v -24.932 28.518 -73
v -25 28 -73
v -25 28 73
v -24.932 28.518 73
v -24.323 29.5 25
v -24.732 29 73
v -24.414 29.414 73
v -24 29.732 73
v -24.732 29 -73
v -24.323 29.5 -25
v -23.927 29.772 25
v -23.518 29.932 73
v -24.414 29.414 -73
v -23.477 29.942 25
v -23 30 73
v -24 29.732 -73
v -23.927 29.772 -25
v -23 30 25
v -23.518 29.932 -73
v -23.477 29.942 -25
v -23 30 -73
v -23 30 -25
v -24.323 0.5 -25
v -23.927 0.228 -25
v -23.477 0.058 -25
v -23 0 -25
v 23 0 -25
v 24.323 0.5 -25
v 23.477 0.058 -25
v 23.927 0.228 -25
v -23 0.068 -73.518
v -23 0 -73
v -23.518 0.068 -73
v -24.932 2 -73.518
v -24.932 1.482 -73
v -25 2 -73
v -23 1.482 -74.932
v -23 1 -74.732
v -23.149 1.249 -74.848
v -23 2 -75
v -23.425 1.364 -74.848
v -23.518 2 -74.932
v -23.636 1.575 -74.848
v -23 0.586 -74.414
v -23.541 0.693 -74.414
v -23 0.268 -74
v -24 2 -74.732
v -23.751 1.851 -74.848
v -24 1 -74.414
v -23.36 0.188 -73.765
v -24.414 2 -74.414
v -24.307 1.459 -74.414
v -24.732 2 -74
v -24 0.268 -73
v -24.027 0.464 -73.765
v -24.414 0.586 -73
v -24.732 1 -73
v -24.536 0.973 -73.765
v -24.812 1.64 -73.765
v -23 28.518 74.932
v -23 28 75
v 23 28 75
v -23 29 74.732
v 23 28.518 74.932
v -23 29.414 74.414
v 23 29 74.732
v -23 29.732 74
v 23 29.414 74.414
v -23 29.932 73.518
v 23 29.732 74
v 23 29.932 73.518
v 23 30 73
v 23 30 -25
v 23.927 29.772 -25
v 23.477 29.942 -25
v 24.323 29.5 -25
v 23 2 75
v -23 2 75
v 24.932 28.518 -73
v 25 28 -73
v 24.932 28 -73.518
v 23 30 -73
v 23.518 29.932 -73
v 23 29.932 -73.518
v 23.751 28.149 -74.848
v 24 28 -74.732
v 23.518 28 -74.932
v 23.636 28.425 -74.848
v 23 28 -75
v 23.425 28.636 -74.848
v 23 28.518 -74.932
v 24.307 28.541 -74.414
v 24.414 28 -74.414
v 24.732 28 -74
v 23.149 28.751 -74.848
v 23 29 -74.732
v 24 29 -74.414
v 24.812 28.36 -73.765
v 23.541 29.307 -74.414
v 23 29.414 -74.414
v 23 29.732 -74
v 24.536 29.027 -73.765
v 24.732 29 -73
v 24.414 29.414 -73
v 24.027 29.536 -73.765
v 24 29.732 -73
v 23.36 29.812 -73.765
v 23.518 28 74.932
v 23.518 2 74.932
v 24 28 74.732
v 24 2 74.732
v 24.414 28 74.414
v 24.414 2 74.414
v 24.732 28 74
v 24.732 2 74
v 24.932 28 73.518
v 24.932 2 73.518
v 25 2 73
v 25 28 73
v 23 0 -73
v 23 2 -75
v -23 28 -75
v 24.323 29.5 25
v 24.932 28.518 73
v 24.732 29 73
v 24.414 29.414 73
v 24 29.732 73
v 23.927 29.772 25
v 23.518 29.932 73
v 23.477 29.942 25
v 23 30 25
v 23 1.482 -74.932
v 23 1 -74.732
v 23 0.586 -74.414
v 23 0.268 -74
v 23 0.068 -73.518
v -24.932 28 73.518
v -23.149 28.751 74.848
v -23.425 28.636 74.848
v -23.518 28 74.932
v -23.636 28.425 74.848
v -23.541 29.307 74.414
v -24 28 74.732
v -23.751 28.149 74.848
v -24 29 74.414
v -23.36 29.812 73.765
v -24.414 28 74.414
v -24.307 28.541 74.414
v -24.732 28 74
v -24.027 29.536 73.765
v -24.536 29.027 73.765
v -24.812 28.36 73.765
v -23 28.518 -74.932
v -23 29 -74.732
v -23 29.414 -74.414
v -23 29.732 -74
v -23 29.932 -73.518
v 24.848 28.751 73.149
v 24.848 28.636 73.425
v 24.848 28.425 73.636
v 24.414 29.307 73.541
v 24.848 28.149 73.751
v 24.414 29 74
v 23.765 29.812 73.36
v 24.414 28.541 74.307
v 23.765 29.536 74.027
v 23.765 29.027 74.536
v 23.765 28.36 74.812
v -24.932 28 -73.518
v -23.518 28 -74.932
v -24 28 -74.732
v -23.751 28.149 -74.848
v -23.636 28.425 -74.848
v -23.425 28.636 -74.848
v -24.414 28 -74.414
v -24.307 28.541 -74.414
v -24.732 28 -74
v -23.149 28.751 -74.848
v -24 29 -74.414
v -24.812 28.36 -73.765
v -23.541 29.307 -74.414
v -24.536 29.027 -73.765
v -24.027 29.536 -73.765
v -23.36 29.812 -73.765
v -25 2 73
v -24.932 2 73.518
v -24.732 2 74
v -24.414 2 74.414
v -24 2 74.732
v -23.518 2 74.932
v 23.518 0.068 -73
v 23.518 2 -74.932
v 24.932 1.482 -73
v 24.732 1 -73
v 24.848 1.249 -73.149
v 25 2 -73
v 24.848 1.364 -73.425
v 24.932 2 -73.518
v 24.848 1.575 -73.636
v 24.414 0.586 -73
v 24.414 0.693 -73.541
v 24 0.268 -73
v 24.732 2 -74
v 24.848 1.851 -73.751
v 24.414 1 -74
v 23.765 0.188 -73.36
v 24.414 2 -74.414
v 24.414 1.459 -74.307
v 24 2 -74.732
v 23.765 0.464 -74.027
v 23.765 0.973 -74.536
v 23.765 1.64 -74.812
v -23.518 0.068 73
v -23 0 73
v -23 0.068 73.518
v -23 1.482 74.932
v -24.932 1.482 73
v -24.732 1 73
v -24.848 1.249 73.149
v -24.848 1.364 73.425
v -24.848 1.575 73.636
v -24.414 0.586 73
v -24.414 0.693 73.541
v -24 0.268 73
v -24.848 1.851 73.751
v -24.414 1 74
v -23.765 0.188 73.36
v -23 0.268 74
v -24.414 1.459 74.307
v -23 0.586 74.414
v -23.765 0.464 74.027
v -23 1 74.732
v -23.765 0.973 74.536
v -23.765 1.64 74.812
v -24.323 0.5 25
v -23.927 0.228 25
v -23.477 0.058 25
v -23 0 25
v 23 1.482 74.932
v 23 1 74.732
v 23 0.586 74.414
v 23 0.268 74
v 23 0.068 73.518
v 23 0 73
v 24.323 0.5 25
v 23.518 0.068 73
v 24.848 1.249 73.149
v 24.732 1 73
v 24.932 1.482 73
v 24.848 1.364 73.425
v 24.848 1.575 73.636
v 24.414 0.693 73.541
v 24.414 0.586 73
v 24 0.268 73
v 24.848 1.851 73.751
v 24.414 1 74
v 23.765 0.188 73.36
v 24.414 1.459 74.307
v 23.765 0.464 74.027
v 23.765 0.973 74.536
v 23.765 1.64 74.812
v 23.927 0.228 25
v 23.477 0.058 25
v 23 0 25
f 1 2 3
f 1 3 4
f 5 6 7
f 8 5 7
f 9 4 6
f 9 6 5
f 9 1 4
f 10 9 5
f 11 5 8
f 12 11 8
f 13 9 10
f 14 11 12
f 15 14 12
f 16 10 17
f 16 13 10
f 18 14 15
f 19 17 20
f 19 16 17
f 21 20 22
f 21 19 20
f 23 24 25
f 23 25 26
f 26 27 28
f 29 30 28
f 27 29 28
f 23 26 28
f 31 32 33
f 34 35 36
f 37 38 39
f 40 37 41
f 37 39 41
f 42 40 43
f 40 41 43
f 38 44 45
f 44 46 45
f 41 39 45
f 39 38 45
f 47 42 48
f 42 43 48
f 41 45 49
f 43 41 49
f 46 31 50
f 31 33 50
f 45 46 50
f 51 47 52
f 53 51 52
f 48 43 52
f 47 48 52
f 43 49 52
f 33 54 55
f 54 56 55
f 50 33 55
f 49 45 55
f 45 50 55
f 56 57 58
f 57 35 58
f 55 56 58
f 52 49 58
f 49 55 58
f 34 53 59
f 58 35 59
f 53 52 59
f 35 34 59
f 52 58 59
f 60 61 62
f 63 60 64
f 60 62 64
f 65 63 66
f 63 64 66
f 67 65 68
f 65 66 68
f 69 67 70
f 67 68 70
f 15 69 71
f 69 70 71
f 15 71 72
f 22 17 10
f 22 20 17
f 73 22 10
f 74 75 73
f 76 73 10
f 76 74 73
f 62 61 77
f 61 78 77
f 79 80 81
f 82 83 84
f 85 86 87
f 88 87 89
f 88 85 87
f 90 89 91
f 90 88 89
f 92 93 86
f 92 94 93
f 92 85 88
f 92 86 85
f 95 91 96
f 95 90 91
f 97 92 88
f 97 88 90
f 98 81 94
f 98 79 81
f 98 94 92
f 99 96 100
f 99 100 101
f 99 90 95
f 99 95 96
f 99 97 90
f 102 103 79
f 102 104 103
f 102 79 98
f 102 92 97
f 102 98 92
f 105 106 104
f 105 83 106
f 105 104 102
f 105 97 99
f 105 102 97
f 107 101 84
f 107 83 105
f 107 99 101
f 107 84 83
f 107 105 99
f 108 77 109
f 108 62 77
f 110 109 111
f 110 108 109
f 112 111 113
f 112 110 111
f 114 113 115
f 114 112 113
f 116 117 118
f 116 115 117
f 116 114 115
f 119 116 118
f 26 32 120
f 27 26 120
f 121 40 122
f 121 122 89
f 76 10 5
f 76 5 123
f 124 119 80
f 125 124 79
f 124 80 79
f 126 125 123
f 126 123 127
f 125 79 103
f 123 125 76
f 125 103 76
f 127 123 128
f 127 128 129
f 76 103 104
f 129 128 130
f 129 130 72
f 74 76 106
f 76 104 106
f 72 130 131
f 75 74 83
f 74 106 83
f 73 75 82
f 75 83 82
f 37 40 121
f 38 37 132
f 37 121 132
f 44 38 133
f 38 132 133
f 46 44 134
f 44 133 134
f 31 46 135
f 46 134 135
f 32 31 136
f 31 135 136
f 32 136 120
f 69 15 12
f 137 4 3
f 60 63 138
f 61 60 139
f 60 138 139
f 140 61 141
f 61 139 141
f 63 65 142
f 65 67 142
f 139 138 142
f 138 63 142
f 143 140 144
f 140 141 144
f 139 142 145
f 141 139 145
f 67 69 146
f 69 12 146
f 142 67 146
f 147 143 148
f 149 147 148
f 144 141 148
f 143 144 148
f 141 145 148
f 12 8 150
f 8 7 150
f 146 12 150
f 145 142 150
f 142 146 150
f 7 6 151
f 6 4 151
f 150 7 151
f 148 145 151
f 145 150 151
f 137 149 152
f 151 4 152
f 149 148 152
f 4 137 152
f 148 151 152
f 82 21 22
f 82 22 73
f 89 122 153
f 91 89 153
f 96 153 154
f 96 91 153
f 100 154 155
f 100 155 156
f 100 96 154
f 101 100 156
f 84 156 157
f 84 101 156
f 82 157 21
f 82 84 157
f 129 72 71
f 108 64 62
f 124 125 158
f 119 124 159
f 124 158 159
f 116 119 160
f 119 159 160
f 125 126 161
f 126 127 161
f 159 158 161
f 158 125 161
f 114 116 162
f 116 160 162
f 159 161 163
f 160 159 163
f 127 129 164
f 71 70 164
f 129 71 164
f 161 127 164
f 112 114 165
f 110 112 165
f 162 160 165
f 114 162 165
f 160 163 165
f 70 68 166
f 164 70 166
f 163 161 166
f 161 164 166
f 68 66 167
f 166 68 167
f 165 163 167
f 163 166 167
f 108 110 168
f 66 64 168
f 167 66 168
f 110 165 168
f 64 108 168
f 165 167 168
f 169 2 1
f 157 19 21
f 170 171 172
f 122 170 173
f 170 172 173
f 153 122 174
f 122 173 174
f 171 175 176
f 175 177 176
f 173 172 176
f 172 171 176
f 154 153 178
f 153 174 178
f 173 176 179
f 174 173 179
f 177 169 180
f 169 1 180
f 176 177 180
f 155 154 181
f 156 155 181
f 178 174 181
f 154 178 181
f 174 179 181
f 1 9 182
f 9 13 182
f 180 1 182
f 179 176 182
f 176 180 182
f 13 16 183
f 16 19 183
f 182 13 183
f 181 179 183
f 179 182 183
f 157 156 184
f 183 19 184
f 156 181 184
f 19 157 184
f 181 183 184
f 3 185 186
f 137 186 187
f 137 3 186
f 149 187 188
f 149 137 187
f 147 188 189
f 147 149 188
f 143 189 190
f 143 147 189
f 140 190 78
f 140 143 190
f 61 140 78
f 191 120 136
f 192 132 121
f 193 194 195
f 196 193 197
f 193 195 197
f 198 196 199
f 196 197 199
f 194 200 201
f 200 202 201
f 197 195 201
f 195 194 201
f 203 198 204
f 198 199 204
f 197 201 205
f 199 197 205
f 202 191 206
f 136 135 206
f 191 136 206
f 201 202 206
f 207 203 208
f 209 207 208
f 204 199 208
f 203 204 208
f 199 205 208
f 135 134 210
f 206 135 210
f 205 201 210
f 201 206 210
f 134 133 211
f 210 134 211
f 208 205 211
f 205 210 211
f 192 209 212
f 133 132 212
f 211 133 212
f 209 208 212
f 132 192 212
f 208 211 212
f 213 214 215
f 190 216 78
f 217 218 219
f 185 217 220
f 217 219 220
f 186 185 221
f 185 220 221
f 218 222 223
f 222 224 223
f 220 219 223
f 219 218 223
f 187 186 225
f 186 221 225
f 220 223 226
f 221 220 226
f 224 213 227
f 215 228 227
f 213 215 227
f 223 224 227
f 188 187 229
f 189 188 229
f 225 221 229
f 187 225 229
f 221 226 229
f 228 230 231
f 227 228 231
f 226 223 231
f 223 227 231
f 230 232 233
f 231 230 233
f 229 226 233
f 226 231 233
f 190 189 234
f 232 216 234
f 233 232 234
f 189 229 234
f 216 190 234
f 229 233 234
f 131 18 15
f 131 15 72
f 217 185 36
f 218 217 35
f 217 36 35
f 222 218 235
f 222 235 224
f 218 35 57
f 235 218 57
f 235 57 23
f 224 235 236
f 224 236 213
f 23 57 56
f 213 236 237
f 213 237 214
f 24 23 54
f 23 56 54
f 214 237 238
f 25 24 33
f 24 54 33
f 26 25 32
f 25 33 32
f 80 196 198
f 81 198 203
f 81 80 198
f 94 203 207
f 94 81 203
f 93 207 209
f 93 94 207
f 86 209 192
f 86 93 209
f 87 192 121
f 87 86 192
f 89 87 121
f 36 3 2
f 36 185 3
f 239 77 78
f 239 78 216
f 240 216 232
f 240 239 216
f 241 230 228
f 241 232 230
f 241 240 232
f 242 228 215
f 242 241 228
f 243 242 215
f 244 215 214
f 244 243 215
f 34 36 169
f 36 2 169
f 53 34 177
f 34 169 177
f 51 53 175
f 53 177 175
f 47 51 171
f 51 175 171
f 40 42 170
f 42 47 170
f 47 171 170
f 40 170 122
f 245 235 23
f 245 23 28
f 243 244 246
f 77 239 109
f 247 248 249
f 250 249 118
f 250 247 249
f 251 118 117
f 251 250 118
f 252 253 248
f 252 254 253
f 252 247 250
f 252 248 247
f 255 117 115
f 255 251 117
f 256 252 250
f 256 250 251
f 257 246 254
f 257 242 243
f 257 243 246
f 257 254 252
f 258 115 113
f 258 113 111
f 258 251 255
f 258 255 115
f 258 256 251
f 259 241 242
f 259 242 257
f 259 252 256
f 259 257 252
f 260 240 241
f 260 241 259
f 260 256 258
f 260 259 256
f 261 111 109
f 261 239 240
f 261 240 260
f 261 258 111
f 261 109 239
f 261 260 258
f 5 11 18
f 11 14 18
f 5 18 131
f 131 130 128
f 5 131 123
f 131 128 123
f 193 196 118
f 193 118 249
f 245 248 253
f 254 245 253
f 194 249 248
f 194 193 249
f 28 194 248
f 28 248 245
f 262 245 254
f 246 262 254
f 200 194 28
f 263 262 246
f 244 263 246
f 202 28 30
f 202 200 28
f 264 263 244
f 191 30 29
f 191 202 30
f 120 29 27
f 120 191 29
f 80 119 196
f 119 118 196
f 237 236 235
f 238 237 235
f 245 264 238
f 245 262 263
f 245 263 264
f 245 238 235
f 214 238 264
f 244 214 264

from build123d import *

# Parameters (mm, degrees)
SKETCH2_W           = 50
SKETCH2_H           = 150
BOSS_EXTRUDE1_DEPTH = 30
FILLET1_R           = 2
SKETCH3_W           = 99.739454276
SKETCH3_H           = 50
CUT_EXTRUDE1_DEPTH  = 0.5
SKETCH4_W           = 84.567654974
SKETCH4_H           = 50
CUT_EXTRUDE2_DEPTH  = 0.5


with BuildPart() as part:
    # Sketch2 → Boss-Extrude1 (new body)
    with BuildSketch(Plane(origin=(0, 0, 0), x_dir=(1, 0, 0), z_dir=(0, 1, 0))):
        Rectangle(SKETCH2_W, SKETCH2_H)
    extrude(amount=BOSS_EXTRUDE1_DEPTH)

    # Fillet1
    fillet1_edges = [part.edges().sort_by_distance(p)[0] for p in [
        (-25, 30, 0),
        (0, 30, 75),
        (25, 30, 0),
        (0, 0, 75),
        (-25, 0, 0),
        (0, 0, -75),
        (25, 0, 0),
        (25, 15, 75),
        (-25, 15, 75),
        (-25, 15, -75),
        (25, 15, -75),
        (0, 30, -75),
    ]]
    fillet(fillet1_edges, radius=FILLET1_R)

    # Sketch3 → Cut-Extrude1 (cut)
    with BuildSketch(Plane(origin=(0, 30, 0), x_dir=(1, 0, 0), z_dir=(0, 1, 0))):
        Rectangle(SKETCH3_W, SKETCH3_H)
    extrude(amount=-CUT_EXTRUDE1_DEPTH, mode=Mode.SUBTRACT)

    # Sketch4 → Cut-Extrude2 (cut)
    with BuildSketch(Plane.XZ):
        Rectangle(SKETCH4_W, SKETCH4_H)
    extrude(amount=-CUT_EXTRUDE2_DEPTH, mode=Mode.SUBTRACT)


solid = part.part
